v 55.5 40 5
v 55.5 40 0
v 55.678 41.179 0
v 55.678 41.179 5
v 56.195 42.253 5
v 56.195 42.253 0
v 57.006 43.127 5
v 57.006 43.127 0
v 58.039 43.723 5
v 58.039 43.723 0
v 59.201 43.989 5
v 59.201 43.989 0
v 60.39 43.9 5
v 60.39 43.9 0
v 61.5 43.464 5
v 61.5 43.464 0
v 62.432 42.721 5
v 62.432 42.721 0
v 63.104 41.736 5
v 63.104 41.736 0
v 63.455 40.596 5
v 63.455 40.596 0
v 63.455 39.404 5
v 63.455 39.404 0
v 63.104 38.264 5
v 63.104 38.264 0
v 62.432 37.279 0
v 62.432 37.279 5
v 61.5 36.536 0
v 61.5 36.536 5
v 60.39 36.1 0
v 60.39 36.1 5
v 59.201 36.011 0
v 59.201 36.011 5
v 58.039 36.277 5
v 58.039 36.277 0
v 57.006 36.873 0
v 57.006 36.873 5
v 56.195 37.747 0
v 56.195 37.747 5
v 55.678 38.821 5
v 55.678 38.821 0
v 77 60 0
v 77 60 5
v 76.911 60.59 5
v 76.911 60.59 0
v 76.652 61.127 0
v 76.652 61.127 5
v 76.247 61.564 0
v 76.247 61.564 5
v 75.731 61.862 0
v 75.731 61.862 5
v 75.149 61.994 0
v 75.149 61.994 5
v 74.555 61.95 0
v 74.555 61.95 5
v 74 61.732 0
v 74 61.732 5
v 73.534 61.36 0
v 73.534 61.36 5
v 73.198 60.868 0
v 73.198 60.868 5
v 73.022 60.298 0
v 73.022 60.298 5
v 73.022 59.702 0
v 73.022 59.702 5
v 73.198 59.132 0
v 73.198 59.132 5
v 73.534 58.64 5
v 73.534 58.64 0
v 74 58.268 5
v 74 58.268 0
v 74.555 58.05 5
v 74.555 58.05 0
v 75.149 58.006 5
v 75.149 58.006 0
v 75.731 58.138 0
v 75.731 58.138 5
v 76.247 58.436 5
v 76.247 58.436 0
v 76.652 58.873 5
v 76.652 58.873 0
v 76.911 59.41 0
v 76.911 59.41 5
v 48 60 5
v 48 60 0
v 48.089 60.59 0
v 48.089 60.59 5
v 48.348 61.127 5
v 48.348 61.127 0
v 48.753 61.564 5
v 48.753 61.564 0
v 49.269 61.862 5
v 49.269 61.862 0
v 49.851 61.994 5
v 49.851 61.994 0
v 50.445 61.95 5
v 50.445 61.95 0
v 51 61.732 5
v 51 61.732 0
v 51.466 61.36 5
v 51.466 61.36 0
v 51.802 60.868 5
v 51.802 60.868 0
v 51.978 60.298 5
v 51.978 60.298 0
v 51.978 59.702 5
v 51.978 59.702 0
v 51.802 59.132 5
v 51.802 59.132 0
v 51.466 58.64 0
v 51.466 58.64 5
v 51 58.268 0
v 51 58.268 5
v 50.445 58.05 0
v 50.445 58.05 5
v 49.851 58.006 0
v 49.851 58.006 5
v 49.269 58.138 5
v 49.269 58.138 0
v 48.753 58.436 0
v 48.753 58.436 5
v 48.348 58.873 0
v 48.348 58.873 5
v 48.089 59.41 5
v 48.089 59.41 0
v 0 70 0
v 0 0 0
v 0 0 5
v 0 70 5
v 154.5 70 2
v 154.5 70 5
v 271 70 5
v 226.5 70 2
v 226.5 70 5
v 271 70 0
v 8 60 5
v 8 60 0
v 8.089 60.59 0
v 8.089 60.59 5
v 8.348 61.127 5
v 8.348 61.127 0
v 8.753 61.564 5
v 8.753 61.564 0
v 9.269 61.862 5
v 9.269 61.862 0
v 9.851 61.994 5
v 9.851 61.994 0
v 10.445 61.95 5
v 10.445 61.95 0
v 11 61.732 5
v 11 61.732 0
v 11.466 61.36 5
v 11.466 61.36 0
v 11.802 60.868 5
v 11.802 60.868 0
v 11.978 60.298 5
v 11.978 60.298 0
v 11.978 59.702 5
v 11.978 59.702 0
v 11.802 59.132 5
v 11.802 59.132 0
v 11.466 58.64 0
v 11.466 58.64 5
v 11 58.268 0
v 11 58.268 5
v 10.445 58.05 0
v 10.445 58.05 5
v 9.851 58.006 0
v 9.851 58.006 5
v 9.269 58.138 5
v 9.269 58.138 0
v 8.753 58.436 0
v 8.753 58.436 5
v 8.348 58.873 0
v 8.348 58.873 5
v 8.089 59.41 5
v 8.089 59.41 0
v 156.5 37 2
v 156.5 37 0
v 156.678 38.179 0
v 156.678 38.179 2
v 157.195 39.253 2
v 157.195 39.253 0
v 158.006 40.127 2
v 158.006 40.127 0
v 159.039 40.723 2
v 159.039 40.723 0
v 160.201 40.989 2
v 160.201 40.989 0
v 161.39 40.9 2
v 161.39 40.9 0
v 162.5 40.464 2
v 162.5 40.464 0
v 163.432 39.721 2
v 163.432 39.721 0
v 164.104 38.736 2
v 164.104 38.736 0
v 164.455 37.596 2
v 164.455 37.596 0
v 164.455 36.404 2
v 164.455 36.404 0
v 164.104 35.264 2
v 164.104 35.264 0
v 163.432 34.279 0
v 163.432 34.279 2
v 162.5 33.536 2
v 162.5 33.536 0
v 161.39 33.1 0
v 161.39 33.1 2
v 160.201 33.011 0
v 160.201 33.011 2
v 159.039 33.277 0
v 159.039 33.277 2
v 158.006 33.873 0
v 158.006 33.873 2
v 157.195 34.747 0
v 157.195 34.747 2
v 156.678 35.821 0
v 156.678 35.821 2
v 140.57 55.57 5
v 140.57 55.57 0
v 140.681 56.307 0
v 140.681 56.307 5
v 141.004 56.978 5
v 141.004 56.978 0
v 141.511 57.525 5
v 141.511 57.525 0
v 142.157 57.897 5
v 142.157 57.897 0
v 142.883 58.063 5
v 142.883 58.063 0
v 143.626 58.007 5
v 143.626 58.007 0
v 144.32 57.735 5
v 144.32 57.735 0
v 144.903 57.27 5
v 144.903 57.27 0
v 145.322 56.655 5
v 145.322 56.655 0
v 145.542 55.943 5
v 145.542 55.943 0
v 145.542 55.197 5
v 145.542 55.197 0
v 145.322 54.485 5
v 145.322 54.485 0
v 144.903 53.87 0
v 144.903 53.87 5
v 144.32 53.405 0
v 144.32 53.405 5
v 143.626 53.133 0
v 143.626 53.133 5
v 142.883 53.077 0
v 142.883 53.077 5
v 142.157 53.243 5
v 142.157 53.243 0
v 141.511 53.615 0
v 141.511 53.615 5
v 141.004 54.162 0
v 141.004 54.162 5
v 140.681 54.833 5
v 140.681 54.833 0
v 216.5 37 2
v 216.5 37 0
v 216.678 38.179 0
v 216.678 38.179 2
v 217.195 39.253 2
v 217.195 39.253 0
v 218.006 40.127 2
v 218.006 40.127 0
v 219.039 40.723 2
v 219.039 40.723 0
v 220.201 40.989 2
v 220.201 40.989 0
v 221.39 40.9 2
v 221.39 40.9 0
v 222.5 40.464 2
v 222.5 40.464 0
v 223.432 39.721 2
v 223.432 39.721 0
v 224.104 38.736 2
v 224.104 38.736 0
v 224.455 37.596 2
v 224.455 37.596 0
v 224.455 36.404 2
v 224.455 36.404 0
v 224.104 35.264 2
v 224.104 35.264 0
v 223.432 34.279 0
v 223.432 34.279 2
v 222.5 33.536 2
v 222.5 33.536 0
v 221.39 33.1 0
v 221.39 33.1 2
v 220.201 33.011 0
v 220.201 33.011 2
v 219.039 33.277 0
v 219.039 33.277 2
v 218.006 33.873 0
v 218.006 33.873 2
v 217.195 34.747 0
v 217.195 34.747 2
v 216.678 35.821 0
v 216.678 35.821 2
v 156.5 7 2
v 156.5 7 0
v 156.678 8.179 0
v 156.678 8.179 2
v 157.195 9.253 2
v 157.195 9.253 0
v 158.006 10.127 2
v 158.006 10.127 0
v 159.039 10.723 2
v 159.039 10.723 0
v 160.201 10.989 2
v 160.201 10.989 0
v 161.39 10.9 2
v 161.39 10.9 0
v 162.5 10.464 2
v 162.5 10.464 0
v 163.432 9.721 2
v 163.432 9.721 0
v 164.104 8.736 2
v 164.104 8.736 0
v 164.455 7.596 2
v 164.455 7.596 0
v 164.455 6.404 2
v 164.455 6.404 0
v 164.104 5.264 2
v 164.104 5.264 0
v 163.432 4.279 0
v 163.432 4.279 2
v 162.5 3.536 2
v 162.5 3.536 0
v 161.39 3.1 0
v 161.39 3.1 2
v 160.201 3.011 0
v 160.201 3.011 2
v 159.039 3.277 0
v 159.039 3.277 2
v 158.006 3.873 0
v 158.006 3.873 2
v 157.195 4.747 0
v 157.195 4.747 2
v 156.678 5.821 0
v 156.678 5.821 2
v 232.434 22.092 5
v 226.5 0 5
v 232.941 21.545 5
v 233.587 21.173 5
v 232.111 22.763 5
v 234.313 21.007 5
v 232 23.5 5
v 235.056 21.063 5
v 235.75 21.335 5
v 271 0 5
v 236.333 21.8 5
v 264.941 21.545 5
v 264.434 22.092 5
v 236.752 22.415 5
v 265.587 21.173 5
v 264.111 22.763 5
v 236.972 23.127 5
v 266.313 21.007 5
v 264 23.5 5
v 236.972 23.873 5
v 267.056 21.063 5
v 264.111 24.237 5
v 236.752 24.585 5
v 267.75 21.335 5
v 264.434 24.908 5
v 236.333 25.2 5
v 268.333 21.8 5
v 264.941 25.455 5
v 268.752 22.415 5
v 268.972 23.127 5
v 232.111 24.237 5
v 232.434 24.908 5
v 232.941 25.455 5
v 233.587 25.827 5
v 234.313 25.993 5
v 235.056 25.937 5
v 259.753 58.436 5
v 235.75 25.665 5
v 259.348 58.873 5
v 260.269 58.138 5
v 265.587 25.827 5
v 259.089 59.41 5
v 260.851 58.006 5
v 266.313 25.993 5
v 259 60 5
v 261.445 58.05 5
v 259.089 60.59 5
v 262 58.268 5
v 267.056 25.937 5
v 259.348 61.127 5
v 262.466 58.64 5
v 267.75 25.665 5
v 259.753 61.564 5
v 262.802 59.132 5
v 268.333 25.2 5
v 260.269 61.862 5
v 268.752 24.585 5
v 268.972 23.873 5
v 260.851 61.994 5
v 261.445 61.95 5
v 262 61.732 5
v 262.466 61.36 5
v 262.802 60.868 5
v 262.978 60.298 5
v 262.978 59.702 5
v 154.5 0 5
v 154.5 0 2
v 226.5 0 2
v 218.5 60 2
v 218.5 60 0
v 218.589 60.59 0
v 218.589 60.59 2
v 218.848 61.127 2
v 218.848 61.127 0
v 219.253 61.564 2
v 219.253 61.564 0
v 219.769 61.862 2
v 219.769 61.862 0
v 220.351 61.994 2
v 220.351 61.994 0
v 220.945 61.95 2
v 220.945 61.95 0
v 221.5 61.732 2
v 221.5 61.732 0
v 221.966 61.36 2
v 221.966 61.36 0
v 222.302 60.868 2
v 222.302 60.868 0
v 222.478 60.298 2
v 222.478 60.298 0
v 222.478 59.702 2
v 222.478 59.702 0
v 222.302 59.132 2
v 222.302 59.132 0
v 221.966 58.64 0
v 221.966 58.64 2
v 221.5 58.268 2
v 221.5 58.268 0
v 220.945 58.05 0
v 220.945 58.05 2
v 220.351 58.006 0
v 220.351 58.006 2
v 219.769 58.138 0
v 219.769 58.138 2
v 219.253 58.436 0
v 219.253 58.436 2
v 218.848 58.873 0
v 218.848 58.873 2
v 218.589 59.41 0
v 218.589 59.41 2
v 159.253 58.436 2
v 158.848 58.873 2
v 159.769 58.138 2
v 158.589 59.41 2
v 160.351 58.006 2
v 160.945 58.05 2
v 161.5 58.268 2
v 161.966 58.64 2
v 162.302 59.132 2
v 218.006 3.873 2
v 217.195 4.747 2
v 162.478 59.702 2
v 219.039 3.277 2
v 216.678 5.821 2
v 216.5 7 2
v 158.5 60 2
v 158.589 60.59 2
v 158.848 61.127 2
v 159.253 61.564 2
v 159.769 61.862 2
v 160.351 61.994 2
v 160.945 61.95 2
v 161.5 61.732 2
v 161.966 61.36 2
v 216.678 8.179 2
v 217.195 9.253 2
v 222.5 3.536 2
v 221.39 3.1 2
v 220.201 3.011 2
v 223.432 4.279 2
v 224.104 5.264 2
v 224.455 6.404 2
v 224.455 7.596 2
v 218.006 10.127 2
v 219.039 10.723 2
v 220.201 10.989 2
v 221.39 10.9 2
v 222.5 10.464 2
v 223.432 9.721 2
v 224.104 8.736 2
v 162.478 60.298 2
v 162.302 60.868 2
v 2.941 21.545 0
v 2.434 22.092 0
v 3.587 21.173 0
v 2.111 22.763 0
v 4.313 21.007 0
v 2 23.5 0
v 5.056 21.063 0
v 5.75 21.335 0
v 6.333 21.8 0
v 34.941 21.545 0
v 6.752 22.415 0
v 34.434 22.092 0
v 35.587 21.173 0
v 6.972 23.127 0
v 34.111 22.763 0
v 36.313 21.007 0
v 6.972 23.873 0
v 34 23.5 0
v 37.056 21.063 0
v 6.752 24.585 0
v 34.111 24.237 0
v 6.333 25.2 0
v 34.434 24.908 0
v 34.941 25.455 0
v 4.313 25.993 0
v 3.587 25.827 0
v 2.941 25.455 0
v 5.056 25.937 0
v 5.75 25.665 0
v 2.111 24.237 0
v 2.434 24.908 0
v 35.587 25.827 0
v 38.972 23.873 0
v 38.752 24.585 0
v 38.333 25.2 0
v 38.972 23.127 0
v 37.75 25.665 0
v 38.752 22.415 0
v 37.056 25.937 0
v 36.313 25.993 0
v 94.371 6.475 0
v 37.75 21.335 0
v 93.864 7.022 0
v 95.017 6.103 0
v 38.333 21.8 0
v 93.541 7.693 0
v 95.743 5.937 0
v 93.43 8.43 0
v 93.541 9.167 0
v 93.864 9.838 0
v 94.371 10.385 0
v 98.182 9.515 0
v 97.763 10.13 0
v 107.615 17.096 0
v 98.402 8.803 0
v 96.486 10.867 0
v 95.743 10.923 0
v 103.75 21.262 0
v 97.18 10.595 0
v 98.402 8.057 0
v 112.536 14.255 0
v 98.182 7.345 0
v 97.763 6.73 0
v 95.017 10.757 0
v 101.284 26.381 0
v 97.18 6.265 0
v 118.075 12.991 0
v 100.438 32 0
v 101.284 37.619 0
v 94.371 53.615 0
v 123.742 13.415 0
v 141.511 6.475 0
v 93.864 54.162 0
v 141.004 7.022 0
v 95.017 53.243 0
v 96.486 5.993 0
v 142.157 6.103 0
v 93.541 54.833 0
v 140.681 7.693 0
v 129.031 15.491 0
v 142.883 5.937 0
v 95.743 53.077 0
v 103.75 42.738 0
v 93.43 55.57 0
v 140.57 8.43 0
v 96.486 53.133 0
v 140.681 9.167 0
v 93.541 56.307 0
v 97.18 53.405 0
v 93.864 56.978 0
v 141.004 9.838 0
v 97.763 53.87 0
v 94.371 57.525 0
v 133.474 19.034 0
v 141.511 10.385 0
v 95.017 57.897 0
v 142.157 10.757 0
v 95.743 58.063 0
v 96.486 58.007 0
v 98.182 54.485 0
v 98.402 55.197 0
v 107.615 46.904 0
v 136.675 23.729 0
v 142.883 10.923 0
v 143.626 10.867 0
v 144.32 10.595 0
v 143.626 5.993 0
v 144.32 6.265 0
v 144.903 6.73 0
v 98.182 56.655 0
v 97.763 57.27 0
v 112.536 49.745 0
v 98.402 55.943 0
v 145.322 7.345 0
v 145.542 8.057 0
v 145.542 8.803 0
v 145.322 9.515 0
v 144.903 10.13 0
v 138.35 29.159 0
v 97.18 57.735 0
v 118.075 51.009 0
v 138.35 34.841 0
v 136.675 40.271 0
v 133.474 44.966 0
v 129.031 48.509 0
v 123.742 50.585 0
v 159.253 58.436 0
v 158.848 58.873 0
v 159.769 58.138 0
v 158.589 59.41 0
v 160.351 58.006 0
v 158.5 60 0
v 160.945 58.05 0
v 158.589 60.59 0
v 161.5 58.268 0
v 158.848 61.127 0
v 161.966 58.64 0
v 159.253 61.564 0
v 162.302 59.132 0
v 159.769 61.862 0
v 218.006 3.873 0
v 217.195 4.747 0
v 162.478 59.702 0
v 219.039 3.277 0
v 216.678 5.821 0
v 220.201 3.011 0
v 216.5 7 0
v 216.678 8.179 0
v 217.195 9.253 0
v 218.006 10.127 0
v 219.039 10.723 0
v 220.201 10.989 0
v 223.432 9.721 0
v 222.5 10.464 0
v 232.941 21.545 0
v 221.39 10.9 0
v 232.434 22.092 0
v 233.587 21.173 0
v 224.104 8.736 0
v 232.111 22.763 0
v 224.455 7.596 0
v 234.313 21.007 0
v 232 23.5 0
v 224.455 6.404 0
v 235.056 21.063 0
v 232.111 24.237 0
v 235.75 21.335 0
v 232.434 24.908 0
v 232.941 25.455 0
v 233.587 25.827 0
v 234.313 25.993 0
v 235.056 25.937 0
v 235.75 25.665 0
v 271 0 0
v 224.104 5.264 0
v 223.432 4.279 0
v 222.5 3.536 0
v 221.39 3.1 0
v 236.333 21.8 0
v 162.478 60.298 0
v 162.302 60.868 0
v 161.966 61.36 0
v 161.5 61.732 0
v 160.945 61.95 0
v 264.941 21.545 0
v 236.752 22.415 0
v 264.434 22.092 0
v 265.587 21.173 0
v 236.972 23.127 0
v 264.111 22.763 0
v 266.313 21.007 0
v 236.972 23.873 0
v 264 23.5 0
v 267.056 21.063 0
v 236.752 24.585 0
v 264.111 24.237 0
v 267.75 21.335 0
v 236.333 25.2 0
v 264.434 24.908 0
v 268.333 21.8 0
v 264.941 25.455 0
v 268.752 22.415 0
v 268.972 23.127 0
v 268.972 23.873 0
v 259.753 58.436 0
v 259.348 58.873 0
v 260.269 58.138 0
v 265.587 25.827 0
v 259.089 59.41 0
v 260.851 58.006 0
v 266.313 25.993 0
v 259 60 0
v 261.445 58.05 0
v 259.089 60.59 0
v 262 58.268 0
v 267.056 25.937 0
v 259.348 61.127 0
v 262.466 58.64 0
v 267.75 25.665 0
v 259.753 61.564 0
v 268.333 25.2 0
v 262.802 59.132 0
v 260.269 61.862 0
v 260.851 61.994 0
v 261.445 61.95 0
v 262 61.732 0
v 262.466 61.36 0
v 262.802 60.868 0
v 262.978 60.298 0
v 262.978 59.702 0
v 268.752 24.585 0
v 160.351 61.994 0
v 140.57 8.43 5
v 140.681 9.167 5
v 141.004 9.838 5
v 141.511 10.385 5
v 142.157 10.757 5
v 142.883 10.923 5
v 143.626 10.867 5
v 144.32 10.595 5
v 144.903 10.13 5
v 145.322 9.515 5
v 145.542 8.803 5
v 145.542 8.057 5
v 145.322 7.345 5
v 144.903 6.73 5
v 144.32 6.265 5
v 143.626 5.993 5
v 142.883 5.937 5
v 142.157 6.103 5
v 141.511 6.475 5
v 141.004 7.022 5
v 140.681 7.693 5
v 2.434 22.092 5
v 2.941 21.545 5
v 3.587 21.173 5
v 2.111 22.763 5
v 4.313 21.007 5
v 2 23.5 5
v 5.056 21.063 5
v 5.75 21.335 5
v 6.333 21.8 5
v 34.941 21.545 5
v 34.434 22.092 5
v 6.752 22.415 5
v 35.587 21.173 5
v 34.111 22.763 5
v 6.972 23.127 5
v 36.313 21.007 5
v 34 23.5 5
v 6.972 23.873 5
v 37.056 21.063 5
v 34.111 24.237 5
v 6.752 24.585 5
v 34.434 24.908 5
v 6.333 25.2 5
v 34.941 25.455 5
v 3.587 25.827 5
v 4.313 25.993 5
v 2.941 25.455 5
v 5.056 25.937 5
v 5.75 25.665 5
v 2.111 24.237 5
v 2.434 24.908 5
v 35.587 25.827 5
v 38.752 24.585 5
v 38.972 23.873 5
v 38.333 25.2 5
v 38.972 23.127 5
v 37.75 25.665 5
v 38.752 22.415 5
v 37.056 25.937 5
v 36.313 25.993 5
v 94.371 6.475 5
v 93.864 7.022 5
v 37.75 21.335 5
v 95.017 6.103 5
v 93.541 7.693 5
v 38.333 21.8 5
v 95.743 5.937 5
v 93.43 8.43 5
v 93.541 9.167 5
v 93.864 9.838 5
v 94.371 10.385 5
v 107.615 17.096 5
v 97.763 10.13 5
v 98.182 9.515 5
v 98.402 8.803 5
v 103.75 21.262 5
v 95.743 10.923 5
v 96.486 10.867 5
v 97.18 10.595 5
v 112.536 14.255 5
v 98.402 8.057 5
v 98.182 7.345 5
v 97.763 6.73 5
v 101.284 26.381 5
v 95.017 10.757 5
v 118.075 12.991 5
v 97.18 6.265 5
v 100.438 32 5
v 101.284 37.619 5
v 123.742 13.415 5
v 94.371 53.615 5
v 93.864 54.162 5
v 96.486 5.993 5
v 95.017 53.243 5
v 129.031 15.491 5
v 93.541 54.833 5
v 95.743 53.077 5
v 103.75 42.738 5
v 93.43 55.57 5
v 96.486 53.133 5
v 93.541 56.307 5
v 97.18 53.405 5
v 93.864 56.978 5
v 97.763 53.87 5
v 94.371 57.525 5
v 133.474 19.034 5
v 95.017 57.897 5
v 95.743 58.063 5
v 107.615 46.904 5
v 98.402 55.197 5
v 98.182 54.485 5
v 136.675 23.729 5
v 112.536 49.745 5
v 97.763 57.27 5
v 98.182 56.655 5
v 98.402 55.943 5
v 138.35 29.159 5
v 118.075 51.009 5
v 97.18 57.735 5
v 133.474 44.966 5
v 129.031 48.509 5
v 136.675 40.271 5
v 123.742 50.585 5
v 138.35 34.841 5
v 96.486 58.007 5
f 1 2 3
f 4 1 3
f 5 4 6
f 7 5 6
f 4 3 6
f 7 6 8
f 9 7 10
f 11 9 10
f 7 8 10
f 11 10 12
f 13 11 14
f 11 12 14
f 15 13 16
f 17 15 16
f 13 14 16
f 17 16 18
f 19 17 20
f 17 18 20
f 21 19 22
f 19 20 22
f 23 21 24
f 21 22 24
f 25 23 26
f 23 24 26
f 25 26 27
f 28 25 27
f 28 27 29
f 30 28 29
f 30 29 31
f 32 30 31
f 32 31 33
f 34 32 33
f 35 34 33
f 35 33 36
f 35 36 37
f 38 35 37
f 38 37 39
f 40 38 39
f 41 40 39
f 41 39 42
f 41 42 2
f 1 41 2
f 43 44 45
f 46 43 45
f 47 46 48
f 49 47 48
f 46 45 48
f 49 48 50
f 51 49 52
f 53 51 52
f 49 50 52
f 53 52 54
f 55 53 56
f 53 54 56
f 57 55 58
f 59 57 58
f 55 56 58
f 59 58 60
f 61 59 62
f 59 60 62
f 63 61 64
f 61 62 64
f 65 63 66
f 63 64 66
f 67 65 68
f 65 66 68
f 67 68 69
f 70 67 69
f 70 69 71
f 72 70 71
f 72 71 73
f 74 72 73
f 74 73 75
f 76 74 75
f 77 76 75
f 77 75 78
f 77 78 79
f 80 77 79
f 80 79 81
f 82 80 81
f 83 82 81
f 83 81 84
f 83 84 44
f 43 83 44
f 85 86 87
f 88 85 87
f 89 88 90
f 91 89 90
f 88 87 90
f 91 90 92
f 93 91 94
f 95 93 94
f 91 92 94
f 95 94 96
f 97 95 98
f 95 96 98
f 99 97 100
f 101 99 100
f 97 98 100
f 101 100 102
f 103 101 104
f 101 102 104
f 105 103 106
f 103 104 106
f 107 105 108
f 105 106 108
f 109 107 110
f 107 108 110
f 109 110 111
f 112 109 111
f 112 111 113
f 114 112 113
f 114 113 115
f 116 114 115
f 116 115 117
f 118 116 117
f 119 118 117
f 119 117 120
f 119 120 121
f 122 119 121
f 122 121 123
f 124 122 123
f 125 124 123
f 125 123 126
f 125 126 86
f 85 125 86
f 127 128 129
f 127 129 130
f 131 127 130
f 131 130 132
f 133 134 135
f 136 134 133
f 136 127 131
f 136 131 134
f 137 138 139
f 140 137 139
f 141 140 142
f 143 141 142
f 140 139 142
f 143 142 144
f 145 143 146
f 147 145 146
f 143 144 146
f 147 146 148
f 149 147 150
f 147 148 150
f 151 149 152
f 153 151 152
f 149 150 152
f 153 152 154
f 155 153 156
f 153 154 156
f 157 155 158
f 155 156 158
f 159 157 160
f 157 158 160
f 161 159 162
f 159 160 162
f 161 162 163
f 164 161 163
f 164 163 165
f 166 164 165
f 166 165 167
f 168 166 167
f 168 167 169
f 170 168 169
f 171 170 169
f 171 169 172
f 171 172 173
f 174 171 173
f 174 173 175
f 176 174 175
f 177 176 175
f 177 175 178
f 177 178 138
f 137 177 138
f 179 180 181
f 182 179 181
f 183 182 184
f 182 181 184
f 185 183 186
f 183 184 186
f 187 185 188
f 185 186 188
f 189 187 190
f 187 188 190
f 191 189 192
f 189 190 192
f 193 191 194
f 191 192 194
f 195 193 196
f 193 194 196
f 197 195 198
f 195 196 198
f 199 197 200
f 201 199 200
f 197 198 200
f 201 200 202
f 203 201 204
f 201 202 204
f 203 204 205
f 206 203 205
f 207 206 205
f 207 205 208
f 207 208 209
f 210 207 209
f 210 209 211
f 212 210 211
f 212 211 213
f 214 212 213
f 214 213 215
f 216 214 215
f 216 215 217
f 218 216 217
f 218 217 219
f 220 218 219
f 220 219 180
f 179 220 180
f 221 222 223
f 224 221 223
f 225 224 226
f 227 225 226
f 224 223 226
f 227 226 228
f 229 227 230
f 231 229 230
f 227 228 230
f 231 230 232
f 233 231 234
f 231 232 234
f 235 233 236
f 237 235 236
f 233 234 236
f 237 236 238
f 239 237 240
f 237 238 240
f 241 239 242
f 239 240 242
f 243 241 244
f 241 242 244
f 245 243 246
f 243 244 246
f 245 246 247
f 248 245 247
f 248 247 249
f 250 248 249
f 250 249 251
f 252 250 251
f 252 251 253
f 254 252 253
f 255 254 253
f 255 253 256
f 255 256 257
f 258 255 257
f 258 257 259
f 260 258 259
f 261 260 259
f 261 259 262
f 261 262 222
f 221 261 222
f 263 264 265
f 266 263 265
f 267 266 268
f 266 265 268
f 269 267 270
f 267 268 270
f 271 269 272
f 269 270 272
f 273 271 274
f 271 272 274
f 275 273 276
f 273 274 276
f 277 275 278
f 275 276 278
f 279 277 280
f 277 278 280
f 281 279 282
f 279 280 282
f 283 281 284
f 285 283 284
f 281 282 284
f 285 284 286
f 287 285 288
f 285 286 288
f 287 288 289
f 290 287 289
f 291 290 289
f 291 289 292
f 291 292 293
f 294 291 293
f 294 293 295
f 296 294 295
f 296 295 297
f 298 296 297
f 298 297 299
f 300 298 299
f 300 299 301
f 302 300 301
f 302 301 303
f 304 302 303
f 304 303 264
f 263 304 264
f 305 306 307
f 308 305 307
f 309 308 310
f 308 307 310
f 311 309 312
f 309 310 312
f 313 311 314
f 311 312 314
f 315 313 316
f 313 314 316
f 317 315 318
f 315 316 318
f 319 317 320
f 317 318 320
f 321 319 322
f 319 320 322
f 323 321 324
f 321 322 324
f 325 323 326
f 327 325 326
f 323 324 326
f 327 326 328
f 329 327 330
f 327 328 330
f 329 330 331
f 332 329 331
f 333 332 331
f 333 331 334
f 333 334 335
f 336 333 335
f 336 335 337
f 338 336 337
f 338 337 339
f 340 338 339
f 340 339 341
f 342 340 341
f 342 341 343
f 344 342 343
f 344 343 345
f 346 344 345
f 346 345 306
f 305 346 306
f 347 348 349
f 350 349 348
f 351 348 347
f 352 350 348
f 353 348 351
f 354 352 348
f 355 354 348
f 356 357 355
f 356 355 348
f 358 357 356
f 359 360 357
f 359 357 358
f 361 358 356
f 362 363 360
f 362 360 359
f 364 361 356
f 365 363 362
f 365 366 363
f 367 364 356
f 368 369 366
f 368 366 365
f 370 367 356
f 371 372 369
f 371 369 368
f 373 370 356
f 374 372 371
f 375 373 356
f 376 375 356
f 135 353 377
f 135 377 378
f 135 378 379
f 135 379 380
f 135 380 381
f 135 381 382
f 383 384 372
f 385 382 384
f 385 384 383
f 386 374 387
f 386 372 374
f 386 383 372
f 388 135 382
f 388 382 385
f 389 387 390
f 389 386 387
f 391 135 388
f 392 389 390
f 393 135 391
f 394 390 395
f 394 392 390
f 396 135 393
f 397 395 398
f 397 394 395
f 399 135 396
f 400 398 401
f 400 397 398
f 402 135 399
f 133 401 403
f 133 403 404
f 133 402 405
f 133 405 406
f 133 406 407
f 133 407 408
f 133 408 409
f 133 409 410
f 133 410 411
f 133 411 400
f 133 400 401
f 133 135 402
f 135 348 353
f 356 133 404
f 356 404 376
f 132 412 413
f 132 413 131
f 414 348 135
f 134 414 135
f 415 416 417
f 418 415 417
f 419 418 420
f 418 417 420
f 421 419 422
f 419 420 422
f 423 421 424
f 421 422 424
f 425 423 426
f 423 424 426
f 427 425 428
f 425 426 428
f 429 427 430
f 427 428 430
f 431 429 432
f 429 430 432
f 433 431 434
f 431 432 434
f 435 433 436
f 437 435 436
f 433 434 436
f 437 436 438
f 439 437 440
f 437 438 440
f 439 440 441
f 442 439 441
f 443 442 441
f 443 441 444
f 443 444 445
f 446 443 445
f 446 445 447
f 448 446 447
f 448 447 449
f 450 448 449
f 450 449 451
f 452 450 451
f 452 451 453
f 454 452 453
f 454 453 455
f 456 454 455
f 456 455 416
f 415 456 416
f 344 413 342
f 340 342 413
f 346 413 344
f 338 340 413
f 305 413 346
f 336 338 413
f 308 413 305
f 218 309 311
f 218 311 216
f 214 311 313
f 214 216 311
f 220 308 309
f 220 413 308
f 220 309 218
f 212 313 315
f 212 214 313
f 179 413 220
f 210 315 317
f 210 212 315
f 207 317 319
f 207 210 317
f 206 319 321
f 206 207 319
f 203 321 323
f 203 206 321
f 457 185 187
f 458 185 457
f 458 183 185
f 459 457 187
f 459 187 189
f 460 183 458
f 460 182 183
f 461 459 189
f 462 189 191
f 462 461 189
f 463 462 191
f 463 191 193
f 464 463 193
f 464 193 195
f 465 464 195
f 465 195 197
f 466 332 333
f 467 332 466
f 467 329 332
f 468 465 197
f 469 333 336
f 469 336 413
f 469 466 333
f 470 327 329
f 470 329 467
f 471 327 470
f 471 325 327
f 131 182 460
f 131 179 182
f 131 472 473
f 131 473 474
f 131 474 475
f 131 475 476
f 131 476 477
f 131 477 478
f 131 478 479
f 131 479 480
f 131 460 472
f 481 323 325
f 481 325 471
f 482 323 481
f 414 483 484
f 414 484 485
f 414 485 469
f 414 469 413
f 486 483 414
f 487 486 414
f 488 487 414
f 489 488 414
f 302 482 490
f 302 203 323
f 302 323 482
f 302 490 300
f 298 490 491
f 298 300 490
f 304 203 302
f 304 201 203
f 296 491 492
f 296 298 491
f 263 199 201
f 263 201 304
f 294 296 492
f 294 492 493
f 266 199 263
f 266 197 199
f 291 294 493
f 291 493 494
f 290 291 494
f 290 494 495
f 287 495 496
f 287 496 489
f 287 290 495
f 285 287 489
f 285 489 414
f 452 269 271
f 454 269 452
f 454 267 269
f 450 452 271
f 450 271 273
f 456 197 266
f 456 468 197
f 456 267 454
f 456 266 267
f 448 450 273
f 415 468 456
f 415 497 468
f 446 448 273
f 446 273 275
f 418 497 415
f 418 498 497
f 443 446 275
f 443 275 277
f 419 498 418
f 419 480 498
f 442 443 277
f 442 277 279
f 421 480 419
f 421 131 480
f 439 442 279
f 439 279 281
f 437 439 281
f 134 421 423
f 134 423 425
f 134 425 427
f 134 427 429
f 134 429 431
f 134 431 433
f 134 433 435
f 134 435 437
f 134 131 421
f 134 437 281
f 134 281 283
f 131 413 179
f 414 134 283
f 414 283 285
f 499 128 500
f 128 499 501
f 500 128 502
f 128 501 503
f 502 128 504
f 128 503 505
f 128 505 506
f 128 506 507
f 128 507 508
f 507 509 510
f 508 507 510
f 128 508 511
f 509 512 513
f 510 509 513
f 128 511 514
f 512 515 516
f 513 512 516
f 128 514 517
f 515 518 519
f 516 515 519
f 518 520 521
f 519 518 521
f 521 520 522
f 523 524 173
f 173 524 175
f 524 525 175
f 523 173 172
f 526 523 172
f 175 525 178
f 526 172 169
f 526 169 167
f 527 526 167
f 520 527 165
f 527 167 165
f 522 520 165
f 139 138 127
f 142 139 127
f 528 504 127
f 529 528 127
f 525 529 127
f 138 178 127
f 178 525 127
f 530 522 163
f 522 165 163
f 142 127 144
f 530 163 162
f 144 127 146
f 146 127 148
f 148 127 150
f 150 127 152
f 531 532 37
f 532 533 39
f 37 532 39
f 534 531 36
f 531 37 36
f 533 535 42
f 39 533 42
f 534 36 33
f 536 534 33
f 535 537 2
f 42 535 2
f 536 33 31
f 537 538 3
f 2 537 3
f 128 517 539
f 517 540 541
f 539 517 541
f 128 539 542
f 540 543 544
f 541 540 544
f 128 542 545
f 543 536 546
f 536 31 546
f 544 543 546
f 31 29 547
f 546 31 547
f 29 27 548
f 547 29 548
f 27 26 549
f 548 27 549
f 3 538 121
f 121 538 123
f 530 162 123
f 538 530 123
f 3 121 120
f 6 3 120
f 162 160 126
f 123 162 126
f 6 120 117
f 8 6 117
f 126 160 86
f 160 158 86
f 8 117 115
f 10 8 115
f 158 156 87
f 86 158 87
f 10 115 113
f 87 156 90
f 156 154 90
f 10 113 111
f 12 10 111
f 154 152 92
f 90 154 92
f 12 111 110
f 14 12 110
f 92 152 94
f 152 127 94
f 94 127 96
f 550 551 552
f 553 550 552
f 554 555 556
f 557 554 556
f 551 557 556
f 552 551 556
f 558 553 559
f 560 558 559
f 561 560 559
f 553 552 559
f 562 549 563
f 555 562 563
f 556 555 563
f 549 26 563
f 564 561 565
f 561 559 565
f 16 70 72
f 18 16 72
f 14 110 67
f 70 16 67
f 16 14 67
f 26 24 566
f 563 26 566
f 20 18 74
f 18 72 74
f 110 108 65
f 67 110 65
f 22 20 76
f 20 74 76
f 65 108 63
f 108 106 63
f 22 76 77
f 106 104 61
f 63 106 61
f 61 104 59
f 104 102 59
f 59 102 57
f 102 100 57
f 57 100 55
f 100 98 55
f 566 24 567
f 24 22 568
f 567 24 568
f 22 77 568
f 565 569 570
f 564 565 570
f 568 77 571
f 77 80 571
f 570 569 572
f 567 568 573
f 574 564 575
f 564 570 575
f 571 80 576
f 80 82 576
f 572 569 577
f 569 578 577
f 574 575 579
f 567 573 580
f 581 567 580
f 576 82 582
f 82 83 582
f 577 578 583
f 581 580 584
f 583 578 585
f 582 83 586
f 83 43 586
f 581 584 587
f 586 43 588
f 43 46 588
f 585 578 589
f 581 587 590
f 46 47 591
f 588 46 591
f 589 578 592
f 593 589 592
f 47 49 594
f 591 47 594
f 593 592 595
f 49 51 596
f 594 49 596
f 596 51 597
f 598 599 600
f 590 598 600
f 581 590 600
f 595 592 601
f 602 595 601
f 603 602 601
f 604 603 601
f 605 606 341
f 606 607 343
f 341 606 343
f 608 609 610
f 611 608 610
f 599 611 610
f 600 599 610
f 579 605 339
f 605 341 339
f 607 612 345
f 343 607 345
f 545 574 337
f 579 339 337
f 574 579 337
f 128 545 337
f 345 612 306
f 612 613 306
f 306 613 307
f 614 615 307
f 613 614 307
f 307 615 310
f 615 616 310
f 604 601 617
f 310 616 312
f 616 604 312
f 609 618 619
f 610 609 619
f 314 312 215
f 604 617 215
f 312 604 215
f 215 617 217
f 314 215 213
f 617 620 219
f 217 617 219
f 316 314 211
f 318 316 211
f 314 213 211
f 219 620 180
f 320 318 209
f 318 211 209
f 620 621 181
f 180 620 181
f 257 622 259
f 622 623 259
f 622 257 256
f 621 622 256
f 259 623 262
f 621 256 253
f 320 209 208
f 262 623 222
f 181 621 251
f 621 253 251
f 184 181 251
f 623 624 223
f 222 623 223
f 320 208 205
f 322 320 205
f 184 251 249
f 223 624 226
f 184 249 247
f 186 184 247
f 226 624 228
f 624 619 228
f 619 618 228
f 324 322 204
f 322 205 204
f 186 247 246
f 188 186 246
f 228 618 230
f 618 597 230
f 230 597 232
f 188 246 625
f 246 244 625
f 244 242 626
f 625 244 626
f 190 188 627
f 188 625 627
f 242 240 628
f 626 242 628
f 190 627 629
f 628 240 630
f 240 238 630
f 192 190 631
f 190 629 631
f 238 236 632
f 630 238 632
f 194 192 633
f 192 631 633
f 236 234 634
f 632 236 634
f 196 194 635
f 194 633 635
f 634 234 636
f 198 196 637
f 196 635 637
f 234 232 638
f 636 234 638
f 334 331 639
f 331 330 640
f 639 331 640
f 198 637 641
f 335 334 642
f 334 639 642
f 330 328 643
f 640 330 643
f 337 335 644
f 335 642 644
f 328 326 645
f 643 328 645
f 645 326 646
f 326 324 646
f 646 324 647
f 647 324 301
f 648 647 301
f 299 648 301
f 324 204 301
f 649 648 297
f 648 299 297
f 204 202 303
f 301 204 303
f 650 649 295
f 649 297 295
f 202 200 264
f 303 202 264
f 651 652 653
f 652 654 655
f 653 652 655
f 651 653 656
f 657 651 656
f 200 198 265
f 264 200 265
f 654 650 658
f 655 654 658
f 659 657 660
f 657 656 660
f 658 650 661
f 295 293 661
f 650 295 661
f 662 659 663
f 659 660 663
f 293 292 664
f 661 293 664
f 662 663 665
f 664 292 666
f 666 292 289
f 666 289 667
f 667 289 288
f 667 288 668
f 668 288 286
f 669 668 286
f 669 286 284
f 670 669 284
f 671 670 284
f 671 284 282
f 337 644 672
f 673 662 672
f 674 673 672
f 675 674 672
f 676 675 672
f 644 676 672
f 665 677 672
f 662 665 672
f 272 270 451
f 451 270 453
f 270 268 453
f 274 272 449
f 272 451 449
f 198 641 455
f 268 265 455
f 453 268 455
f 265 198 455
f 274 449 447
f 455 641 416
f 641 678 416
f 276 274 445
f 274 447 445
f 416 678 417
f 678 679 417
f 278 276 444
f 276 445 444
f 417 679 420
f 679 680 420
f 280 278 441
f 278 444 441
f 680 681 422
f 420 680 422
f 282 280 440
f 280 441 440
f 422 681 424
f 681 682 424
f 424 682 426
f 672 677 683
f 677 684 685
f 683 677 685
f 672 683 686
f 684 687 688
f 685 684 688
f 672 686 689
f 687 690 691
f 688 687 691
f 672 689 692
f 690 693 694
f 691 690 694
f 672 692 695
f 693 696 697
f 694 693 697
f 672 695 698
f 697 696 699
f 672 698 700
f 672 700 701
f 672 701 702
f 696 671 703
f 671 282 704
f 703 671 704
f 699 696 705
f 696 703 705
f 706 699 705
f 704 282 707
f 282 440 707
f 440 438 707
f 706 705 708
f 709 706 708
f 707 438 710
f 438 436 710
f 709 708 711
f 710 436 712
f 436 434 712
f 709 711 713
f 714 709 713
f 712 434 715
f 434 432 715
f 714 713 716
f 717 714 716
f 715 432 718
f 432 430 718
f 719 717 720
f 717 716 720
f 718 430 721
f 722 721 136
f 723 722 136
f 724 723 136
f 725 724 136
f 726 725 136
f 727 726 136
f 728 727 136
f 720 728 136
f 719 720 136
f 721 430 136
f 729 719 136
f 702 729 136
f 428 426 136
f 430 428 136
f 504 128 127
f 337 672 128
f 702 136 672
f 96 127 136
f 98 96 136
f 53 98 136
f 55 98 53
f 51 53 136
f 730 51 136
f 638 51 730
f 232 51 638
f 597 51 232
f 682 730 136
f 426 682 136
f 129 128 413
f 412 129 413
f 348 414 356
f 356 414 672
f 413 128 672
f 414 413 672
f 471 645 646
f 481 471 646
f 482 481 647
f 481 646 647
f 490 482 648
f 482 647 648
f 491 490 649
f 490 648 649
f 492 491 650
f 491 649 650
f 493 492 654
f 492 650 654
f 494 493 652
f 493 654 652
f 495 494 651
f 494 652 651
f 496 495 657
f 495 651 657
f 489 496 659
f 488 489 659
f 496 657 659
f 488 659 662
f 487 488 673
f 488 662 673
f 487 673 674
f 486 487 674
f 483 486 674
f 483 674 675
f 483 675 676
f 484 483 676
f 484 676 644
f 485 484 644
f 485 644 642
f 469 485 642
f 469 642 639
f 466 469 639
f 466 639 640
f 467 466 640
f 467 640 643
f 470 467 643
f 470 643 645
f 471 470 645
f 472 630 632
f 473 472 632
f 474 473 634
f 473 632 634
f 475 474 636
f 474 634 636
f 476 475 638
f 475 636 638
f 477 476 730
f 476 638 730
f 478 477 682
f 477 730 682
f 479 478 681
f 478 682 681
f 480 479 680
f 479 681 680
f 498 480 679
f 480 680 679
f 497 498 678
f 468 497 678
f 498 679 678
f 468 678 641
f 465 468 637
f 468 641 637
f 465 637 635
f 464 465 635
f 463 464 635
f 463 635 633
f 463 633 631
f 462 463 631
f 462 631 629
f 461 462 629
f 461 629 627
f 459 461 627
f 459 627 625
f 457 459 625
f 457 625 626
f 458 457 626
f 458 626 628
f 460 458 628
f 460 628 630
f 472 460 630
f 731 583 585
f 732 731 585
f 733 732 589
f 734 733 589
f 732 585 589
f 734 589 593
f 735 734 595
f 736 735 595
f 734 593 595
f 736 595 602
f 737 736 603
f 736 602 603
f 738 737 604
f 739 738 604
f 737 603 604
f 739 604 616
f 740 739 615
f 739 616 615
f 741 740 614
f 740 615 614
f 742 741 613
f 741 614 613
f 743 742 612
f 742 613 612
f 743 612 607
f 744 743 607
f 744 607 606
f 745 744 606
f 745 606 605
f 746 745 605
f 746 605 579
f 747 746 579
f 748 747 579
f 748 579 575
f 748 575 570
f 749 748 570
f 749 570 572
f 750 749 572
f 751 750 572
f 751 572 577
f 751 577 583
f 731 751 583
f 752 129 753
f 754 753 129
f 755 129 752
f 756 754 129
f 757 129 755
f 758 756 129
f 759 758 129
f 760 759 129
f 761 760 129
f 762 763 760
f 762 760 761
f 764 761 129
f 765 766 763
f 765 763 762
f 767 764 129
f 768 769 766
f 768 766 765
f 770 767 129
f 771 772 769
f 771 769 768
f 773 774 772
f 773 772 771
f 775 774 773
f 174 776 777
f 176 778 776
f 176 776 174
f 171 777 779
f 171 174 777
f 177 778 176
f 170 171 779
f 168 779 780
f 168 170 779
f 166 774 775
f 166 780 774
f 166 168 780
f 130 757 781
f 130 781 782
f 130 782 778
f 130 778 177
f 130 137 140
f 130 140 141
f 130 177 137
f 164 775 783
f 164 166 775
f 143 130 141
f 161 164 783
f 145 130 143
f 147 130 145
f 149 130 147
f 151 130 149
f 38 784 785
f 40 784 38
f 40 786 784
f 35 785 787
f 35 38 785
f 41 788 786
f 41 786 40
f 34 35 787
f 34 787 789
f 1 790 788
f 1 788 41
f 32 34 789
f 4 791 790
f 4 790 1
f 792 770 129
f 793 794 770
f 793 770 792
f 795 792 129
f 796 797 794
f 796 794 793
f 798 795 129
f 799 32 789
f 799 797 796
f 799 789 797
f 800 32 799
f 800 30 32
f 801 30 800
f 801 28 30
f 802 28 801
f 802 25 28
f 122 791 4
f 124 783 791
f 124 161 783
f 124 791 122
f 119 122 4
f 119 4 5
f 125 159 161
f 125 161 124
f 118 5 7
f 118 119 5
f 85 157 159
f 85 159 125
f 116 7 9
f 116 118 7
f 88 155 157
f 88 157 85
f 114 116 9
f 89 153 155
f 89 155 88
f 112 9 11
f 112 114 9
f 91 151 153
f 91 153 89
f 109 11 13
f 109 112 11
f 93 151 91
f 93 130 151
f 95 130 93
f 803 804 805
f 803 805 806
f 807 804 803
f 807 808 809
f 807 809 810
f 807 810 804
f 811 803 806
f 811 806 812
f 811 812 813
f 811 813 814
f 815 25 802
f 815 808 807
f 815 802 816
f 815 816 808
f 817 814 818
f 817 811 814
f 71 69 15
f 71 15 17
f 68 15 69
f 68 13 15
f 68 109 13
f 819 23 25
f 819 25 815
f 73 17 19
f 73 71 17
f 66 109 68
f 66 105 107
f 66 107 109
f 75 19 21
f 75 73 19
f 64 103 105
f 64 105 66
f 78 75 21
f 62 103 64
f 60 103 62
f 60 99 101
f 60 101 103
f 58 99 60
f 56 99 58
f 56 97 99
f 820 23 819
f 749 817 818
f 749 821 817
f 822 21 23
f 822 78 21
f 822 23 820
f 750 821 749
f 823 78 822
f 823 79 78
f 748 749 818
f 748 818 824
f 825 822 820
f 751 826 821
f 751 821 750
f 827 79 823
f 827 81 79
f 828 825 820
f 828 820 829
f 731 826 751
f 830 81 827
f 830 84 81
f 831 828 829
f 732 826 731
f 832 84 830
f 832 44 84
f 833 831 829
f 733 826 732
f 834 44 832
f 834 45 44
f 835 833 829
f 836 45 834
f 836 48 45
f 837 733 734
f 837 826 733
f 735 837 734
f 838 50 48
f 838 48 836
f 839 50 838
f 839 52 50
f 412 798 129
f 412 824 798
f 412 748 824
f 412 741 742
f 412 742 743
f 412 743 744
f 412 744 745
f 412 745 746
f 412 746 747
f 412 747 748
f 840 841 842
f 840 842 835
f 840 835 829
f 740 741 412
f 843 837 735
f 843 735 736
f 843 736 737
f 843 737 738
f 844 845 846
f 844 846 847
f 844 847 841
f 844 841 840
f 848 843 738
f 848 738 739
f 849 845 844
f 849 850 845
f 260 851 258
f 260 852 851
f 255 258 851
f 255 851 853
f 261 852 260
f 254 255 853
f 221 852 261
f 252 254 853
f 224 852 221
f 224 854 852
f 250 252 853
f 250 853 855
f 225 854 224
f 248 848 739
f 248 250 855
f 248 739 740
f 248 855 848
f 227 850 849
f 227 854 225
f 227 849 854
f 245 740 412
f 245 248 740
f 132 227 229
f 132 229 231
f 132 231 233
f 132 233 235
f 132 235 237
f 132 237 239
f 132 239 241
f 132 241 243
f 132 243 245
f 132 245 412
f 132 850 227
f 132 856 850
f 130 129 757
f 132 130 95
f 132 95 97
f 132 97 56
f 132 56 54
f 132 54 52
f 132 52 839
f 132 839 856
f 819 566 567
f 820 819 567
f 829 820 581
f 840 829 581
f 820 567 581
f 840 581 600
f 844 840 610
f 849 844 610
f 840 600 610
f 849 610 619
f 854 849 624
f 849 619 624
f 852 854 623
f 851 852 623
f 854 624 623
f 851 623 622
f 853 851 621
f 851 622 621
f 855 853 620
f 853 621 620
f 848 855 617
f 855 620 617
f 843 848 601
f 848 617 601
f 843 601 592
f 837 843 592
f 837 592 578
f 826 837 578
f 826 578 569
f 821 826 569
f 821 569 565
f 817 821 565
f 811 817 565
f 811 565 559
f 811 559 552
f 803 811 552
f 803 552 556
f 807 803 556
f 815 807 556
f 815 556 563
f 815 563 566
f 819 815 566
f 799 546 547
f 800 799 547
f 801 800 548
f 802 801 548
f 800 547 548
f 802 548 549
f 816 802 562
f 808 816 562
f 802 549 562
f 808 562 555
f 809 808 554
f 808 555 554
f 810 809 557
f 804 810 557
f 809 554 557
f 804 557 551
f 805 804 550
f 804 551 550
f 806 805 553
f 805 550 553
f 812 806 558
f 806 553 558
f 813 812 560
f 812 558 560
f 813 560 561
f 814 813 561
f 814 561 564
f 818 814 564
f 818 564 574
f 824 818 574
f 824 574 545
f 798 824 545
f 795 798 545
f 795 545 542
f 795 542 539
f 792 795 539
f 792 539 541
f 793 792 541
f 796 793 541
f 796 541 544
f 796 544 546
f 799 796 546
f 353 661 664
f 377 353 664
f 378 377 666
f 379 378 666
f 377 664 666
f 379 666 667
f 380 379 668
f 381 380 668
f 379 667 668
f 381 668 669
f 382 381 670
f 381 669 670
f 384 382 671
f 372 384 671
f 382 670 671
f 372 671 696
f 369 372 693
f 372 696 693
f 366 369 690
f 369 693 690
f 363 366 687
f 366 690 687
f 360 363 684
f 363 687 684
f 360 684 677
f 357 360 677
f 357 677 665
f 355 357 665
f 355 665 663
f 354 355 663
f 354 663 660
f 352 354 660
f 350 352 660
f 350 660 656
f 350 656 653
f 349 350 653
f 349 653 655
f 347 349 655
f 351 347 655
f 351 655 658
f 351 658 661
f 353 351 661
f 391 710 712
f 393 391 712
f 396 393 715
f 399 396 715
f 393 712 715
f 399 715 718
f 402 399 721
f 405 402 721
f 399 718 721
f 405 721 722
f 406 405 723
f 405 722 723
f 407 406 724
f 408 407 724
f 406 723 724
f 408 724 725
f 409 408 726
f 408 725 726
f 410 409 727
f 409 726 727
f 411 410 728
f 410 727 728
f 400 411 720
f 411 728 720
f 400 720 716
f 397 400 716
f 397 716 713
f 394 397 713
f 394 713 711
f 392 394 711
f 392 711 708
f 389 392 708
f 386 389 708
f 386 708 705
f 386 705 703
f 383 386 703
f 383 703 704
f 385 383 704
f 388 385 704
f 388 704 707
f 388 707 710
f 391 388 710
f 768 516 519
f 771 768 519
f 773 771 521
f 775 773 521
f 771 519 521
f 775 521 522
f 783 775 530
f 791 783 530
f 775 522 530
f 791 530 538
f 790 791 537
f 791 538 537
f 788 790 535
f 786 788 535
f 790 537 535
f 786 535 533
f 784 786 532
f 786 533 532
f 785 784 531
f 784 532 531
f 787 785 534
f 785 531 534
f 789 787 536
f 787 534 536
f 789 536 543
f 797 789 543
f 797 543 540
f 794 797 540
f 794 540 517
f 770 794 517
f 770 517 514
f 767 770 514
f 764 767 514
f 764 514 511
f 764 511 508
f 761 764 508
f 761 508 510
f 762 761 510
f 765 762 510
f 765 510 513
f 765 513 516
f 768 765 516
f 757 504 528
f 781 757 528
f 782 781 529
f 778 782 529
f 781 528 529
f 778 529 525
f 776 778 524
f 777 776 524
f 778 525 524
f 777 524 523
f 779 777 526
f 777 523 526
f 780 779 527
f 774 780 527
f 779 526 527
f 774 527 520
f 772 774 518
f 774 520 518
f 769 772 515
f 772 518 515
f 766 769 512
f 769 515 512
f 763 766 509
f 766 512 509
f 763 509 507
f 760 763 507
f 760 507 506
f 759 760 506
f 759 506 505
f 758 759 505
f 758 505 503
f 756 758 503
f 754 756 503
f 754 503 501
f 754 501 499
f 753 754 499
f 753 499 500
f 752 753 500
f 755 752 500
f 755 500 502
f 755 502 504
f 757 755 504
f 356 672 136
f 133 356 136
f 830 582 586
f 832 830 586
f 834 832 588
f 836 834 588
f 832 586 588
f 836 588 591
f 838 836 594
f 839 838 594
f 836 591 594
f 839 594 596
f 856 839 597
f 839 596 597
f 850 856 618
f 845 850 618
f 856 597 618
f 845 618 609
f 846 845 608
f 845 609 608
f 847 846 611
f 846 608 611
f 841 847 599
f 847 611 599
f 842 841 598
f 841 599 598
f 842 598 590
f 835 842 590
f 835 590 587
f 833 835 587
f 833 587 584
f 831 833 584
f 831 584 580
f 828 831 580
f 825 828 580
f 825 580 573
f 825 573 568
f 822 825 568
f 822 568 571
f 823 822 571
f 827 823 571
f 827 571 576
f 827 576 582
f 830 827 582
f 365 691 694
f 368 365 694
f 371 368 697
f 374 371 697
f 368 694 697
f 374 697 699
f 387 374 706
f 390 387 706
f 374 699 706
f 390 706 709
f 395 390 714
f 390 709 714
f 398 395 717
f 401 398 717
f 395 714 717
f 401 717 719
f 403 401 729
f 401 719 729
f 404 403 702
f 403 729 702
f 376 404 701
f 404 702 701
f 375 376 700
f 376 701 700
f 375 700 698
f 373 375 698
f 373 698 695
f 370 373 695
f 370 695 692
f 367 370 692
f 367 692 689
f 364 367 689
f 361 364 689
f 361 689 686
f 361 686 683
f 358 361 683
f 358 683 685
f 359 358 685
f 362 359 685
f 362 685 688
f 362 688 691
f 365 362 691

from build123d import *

# Parameters (mm, degrees)
SKIZZE1_W                       = 271
SKIZZE1_H                       = 70
AUFSATZ_LINEAR_AUSTRAGEN1_DEPTH = 5
SKIZZE2_W                       = 72
SKIZZE2_H                       = 70
SCHNITT_LINEAR_AUSTRAGEN1_DEPTH = 3
SKIZZE3_R                       = 4
SCHNITT_LINEAR_AUSTRAGEN2_DEPTH = 10
SKIZZE4_R                       = 2.5
SCHNITT_LINEAR_AUSTRAGEN3_DEPTH = 10
SKIZZE5_R                       = 2.5
SCHNITT_LINEAR_AUSTRAGEN4_DEPTH = 10
SKIZZE6_R                       = 2
SCHNITT_LINEAR_AUSTRAGEN5_DEPTH = 10
SKIZZE7_R                       = 19.0625
SKIZZE7_R_2                     = 2.5
SCHNITT_LINEAR_AUSTRAGEN6_DEPTH = 10
SKIZZE8_R                       = 4
SCHNITT_LINEAR_AUSTRAGEN7_DEPTH = 10
SKIZZE9_R                       = 2
SCHNITT_LINEAR_AUSTRAGEN8_DEPTH = 10


with BuildPart() as part:
    # Skizze1 → Aufsatz-Linear austragen1 (new body)
    with BuildSketch(Plane.XY):
        with Locations((135.5, 35)):
            Rectangle(SKIZZE1_W, SKIZZE1_H)
    extrude(amount=AUFSATZ_LINEAR_AUSTRAGEN1_DEPTH)

    # Skizze2 → Schnitt-Linear austragen1 (cut)
    with BuildSketch(Plane.XY.offset(5)):
        with Locations((190.5, 35)):
            Rectangle(SKIZZE2_W, SKIZZE2_H)
    extrude(amount=-SCHNITT_LINEAR_AUSTRAGEN1_DEPTH, mode=Mode.SUBTRACT)

    # Skizze3 → Schnitt-Linear austragen2 (cut)
    with BuildSketch(Plane(origin=(0, 0, 0), x_dir=(-1, 0, 0), z_dir=(0, 0, -1))):
        with Locations((-160.5, 37)):
            Circle(SKIZZE3_R)
        with Locations((-220.5, 37)):
            Circle(SKIZZE3_R)
        with Locations((-220.5, 7)):
            Circle(SKIZZE3_R)
        with Locations((-160.5, 7)):
            Circle(SKIZZE3_R)
    extrude(amount=-SCHNITT_LINEAR_AUSTRAGEN2_DEPTH, mode=Mode.SUBTRACT)

    # Skizze4 → Schnitt-Linear austragen3 (cut)
    with BuildSketch(Plane(origin=(0, 0, 0), x_dir=(-1, 0, 0), z_dir=(0, 0, -1))):
        with Locations((-234.5, 23.5)):
            Circle(SKIZZE4_R)
        with Locations((-266.5, 23.5)):
            Circle(SKIZZE4_R)
    extrude(amount=-SCHNITT_LINEAR_AUSTRAGEN3_DEPTH, mode=Mode.SUBTRACT)

    # Skizze5 → Schnitt-Linear austragen4 (cut)
    with BuildSketch(Plane(origin=(0, 0, 0), x_dir=(-1, 0, 0), z_dir=(0, 0, -1))):
        with Locations((-36.5, 23.5)):
            Circle(SKIZZE5_R)
        with Locations((-4.5, 23.5)):
            Circle(SKIZZE5_R)
    extrude(amount=-SCHNITT_LINEAR_AUSTRAGEN4_DEPTH, mode=Mode.SUBTRACT)

    # Skizze6 → Schnitt-Linear austragen5 (cut)
    with BuildSketch(Plane(origin=(0, 0, 0), x_dir=(-1, 0, 0), z_dir=(0, 0, -1))):
        with Locations((-10, 60)):
            Circle(SKIZZE6_R)
        with Locations((-50, 60)):
            Circle(SKIZZE6_R)
        with Locations((-160.5, 60)):
            Circle(SKIZZE6_R)
        with Locations((-220.5, 60)):
            Circle(SKIZZE6_R)
        with Locations((-261, 60)):
            Circle(SKIZZE6_R)
    extrude(amount=-SCHNITT_LINEAR_AUSTRAGEN5_DEPTH, mode=Mode.SUBTRACT)

    # Skizze7 → Schnitt-Linear austragen6 (cut)
    with BuildSketch(Plane(origin=(0, 0, 0), x_dir=(-1, 0, 0), z_dir=(0, 0, -1))):
        with Locations((-119.5, 32)):
            Circle(SKIZZE7_R)
        with Locations((-95.93, 8.43)):
            Circle(SKIZZE7_R_2)
        with Locations((-143.07, 8.43)):
            Circle(SKIZZE7_R_2)
        with Locations((-95.93, 55.57)):
            Circle(SKIZZE7_R_2)
        with Locations((-143.07, 55.57)):
            Circle(SKIZZE7_R_2)
    extrude(amount=-SCHNITT_LINEAR_AUSTRAGEN6_DEPTH, mode=Mode.SUBTRACT)

    # Skizze8 → Schnitt-Linear austragen7 (cut)
    with BuildSketch(Plane(origin=(0, 0, 0), x_dir=(-1, 0, 0), z_dir=(0, 0, -1))):
        with Locations((-59.5, 40)):
            Circle(SKIZZE8_R)
    extrude(amount=-SCHNITT_LINEAR_AUSTRAGEN7_DEPTH, mode=Mode.SUBTRACT)

    # Skizze9 → Schnitt-Linear austragen8 (cut)
    with BuildSketch(Plane.XY.offset(5)):
        with Locations((75, 60)):
            Circle(SKIZZE9_R)
    extrude(amount=-SCHNITT_LINEAR_AUSTRAGEN8_DEPTH, mode=Mode.SUBTRACT)


solid = part.part
